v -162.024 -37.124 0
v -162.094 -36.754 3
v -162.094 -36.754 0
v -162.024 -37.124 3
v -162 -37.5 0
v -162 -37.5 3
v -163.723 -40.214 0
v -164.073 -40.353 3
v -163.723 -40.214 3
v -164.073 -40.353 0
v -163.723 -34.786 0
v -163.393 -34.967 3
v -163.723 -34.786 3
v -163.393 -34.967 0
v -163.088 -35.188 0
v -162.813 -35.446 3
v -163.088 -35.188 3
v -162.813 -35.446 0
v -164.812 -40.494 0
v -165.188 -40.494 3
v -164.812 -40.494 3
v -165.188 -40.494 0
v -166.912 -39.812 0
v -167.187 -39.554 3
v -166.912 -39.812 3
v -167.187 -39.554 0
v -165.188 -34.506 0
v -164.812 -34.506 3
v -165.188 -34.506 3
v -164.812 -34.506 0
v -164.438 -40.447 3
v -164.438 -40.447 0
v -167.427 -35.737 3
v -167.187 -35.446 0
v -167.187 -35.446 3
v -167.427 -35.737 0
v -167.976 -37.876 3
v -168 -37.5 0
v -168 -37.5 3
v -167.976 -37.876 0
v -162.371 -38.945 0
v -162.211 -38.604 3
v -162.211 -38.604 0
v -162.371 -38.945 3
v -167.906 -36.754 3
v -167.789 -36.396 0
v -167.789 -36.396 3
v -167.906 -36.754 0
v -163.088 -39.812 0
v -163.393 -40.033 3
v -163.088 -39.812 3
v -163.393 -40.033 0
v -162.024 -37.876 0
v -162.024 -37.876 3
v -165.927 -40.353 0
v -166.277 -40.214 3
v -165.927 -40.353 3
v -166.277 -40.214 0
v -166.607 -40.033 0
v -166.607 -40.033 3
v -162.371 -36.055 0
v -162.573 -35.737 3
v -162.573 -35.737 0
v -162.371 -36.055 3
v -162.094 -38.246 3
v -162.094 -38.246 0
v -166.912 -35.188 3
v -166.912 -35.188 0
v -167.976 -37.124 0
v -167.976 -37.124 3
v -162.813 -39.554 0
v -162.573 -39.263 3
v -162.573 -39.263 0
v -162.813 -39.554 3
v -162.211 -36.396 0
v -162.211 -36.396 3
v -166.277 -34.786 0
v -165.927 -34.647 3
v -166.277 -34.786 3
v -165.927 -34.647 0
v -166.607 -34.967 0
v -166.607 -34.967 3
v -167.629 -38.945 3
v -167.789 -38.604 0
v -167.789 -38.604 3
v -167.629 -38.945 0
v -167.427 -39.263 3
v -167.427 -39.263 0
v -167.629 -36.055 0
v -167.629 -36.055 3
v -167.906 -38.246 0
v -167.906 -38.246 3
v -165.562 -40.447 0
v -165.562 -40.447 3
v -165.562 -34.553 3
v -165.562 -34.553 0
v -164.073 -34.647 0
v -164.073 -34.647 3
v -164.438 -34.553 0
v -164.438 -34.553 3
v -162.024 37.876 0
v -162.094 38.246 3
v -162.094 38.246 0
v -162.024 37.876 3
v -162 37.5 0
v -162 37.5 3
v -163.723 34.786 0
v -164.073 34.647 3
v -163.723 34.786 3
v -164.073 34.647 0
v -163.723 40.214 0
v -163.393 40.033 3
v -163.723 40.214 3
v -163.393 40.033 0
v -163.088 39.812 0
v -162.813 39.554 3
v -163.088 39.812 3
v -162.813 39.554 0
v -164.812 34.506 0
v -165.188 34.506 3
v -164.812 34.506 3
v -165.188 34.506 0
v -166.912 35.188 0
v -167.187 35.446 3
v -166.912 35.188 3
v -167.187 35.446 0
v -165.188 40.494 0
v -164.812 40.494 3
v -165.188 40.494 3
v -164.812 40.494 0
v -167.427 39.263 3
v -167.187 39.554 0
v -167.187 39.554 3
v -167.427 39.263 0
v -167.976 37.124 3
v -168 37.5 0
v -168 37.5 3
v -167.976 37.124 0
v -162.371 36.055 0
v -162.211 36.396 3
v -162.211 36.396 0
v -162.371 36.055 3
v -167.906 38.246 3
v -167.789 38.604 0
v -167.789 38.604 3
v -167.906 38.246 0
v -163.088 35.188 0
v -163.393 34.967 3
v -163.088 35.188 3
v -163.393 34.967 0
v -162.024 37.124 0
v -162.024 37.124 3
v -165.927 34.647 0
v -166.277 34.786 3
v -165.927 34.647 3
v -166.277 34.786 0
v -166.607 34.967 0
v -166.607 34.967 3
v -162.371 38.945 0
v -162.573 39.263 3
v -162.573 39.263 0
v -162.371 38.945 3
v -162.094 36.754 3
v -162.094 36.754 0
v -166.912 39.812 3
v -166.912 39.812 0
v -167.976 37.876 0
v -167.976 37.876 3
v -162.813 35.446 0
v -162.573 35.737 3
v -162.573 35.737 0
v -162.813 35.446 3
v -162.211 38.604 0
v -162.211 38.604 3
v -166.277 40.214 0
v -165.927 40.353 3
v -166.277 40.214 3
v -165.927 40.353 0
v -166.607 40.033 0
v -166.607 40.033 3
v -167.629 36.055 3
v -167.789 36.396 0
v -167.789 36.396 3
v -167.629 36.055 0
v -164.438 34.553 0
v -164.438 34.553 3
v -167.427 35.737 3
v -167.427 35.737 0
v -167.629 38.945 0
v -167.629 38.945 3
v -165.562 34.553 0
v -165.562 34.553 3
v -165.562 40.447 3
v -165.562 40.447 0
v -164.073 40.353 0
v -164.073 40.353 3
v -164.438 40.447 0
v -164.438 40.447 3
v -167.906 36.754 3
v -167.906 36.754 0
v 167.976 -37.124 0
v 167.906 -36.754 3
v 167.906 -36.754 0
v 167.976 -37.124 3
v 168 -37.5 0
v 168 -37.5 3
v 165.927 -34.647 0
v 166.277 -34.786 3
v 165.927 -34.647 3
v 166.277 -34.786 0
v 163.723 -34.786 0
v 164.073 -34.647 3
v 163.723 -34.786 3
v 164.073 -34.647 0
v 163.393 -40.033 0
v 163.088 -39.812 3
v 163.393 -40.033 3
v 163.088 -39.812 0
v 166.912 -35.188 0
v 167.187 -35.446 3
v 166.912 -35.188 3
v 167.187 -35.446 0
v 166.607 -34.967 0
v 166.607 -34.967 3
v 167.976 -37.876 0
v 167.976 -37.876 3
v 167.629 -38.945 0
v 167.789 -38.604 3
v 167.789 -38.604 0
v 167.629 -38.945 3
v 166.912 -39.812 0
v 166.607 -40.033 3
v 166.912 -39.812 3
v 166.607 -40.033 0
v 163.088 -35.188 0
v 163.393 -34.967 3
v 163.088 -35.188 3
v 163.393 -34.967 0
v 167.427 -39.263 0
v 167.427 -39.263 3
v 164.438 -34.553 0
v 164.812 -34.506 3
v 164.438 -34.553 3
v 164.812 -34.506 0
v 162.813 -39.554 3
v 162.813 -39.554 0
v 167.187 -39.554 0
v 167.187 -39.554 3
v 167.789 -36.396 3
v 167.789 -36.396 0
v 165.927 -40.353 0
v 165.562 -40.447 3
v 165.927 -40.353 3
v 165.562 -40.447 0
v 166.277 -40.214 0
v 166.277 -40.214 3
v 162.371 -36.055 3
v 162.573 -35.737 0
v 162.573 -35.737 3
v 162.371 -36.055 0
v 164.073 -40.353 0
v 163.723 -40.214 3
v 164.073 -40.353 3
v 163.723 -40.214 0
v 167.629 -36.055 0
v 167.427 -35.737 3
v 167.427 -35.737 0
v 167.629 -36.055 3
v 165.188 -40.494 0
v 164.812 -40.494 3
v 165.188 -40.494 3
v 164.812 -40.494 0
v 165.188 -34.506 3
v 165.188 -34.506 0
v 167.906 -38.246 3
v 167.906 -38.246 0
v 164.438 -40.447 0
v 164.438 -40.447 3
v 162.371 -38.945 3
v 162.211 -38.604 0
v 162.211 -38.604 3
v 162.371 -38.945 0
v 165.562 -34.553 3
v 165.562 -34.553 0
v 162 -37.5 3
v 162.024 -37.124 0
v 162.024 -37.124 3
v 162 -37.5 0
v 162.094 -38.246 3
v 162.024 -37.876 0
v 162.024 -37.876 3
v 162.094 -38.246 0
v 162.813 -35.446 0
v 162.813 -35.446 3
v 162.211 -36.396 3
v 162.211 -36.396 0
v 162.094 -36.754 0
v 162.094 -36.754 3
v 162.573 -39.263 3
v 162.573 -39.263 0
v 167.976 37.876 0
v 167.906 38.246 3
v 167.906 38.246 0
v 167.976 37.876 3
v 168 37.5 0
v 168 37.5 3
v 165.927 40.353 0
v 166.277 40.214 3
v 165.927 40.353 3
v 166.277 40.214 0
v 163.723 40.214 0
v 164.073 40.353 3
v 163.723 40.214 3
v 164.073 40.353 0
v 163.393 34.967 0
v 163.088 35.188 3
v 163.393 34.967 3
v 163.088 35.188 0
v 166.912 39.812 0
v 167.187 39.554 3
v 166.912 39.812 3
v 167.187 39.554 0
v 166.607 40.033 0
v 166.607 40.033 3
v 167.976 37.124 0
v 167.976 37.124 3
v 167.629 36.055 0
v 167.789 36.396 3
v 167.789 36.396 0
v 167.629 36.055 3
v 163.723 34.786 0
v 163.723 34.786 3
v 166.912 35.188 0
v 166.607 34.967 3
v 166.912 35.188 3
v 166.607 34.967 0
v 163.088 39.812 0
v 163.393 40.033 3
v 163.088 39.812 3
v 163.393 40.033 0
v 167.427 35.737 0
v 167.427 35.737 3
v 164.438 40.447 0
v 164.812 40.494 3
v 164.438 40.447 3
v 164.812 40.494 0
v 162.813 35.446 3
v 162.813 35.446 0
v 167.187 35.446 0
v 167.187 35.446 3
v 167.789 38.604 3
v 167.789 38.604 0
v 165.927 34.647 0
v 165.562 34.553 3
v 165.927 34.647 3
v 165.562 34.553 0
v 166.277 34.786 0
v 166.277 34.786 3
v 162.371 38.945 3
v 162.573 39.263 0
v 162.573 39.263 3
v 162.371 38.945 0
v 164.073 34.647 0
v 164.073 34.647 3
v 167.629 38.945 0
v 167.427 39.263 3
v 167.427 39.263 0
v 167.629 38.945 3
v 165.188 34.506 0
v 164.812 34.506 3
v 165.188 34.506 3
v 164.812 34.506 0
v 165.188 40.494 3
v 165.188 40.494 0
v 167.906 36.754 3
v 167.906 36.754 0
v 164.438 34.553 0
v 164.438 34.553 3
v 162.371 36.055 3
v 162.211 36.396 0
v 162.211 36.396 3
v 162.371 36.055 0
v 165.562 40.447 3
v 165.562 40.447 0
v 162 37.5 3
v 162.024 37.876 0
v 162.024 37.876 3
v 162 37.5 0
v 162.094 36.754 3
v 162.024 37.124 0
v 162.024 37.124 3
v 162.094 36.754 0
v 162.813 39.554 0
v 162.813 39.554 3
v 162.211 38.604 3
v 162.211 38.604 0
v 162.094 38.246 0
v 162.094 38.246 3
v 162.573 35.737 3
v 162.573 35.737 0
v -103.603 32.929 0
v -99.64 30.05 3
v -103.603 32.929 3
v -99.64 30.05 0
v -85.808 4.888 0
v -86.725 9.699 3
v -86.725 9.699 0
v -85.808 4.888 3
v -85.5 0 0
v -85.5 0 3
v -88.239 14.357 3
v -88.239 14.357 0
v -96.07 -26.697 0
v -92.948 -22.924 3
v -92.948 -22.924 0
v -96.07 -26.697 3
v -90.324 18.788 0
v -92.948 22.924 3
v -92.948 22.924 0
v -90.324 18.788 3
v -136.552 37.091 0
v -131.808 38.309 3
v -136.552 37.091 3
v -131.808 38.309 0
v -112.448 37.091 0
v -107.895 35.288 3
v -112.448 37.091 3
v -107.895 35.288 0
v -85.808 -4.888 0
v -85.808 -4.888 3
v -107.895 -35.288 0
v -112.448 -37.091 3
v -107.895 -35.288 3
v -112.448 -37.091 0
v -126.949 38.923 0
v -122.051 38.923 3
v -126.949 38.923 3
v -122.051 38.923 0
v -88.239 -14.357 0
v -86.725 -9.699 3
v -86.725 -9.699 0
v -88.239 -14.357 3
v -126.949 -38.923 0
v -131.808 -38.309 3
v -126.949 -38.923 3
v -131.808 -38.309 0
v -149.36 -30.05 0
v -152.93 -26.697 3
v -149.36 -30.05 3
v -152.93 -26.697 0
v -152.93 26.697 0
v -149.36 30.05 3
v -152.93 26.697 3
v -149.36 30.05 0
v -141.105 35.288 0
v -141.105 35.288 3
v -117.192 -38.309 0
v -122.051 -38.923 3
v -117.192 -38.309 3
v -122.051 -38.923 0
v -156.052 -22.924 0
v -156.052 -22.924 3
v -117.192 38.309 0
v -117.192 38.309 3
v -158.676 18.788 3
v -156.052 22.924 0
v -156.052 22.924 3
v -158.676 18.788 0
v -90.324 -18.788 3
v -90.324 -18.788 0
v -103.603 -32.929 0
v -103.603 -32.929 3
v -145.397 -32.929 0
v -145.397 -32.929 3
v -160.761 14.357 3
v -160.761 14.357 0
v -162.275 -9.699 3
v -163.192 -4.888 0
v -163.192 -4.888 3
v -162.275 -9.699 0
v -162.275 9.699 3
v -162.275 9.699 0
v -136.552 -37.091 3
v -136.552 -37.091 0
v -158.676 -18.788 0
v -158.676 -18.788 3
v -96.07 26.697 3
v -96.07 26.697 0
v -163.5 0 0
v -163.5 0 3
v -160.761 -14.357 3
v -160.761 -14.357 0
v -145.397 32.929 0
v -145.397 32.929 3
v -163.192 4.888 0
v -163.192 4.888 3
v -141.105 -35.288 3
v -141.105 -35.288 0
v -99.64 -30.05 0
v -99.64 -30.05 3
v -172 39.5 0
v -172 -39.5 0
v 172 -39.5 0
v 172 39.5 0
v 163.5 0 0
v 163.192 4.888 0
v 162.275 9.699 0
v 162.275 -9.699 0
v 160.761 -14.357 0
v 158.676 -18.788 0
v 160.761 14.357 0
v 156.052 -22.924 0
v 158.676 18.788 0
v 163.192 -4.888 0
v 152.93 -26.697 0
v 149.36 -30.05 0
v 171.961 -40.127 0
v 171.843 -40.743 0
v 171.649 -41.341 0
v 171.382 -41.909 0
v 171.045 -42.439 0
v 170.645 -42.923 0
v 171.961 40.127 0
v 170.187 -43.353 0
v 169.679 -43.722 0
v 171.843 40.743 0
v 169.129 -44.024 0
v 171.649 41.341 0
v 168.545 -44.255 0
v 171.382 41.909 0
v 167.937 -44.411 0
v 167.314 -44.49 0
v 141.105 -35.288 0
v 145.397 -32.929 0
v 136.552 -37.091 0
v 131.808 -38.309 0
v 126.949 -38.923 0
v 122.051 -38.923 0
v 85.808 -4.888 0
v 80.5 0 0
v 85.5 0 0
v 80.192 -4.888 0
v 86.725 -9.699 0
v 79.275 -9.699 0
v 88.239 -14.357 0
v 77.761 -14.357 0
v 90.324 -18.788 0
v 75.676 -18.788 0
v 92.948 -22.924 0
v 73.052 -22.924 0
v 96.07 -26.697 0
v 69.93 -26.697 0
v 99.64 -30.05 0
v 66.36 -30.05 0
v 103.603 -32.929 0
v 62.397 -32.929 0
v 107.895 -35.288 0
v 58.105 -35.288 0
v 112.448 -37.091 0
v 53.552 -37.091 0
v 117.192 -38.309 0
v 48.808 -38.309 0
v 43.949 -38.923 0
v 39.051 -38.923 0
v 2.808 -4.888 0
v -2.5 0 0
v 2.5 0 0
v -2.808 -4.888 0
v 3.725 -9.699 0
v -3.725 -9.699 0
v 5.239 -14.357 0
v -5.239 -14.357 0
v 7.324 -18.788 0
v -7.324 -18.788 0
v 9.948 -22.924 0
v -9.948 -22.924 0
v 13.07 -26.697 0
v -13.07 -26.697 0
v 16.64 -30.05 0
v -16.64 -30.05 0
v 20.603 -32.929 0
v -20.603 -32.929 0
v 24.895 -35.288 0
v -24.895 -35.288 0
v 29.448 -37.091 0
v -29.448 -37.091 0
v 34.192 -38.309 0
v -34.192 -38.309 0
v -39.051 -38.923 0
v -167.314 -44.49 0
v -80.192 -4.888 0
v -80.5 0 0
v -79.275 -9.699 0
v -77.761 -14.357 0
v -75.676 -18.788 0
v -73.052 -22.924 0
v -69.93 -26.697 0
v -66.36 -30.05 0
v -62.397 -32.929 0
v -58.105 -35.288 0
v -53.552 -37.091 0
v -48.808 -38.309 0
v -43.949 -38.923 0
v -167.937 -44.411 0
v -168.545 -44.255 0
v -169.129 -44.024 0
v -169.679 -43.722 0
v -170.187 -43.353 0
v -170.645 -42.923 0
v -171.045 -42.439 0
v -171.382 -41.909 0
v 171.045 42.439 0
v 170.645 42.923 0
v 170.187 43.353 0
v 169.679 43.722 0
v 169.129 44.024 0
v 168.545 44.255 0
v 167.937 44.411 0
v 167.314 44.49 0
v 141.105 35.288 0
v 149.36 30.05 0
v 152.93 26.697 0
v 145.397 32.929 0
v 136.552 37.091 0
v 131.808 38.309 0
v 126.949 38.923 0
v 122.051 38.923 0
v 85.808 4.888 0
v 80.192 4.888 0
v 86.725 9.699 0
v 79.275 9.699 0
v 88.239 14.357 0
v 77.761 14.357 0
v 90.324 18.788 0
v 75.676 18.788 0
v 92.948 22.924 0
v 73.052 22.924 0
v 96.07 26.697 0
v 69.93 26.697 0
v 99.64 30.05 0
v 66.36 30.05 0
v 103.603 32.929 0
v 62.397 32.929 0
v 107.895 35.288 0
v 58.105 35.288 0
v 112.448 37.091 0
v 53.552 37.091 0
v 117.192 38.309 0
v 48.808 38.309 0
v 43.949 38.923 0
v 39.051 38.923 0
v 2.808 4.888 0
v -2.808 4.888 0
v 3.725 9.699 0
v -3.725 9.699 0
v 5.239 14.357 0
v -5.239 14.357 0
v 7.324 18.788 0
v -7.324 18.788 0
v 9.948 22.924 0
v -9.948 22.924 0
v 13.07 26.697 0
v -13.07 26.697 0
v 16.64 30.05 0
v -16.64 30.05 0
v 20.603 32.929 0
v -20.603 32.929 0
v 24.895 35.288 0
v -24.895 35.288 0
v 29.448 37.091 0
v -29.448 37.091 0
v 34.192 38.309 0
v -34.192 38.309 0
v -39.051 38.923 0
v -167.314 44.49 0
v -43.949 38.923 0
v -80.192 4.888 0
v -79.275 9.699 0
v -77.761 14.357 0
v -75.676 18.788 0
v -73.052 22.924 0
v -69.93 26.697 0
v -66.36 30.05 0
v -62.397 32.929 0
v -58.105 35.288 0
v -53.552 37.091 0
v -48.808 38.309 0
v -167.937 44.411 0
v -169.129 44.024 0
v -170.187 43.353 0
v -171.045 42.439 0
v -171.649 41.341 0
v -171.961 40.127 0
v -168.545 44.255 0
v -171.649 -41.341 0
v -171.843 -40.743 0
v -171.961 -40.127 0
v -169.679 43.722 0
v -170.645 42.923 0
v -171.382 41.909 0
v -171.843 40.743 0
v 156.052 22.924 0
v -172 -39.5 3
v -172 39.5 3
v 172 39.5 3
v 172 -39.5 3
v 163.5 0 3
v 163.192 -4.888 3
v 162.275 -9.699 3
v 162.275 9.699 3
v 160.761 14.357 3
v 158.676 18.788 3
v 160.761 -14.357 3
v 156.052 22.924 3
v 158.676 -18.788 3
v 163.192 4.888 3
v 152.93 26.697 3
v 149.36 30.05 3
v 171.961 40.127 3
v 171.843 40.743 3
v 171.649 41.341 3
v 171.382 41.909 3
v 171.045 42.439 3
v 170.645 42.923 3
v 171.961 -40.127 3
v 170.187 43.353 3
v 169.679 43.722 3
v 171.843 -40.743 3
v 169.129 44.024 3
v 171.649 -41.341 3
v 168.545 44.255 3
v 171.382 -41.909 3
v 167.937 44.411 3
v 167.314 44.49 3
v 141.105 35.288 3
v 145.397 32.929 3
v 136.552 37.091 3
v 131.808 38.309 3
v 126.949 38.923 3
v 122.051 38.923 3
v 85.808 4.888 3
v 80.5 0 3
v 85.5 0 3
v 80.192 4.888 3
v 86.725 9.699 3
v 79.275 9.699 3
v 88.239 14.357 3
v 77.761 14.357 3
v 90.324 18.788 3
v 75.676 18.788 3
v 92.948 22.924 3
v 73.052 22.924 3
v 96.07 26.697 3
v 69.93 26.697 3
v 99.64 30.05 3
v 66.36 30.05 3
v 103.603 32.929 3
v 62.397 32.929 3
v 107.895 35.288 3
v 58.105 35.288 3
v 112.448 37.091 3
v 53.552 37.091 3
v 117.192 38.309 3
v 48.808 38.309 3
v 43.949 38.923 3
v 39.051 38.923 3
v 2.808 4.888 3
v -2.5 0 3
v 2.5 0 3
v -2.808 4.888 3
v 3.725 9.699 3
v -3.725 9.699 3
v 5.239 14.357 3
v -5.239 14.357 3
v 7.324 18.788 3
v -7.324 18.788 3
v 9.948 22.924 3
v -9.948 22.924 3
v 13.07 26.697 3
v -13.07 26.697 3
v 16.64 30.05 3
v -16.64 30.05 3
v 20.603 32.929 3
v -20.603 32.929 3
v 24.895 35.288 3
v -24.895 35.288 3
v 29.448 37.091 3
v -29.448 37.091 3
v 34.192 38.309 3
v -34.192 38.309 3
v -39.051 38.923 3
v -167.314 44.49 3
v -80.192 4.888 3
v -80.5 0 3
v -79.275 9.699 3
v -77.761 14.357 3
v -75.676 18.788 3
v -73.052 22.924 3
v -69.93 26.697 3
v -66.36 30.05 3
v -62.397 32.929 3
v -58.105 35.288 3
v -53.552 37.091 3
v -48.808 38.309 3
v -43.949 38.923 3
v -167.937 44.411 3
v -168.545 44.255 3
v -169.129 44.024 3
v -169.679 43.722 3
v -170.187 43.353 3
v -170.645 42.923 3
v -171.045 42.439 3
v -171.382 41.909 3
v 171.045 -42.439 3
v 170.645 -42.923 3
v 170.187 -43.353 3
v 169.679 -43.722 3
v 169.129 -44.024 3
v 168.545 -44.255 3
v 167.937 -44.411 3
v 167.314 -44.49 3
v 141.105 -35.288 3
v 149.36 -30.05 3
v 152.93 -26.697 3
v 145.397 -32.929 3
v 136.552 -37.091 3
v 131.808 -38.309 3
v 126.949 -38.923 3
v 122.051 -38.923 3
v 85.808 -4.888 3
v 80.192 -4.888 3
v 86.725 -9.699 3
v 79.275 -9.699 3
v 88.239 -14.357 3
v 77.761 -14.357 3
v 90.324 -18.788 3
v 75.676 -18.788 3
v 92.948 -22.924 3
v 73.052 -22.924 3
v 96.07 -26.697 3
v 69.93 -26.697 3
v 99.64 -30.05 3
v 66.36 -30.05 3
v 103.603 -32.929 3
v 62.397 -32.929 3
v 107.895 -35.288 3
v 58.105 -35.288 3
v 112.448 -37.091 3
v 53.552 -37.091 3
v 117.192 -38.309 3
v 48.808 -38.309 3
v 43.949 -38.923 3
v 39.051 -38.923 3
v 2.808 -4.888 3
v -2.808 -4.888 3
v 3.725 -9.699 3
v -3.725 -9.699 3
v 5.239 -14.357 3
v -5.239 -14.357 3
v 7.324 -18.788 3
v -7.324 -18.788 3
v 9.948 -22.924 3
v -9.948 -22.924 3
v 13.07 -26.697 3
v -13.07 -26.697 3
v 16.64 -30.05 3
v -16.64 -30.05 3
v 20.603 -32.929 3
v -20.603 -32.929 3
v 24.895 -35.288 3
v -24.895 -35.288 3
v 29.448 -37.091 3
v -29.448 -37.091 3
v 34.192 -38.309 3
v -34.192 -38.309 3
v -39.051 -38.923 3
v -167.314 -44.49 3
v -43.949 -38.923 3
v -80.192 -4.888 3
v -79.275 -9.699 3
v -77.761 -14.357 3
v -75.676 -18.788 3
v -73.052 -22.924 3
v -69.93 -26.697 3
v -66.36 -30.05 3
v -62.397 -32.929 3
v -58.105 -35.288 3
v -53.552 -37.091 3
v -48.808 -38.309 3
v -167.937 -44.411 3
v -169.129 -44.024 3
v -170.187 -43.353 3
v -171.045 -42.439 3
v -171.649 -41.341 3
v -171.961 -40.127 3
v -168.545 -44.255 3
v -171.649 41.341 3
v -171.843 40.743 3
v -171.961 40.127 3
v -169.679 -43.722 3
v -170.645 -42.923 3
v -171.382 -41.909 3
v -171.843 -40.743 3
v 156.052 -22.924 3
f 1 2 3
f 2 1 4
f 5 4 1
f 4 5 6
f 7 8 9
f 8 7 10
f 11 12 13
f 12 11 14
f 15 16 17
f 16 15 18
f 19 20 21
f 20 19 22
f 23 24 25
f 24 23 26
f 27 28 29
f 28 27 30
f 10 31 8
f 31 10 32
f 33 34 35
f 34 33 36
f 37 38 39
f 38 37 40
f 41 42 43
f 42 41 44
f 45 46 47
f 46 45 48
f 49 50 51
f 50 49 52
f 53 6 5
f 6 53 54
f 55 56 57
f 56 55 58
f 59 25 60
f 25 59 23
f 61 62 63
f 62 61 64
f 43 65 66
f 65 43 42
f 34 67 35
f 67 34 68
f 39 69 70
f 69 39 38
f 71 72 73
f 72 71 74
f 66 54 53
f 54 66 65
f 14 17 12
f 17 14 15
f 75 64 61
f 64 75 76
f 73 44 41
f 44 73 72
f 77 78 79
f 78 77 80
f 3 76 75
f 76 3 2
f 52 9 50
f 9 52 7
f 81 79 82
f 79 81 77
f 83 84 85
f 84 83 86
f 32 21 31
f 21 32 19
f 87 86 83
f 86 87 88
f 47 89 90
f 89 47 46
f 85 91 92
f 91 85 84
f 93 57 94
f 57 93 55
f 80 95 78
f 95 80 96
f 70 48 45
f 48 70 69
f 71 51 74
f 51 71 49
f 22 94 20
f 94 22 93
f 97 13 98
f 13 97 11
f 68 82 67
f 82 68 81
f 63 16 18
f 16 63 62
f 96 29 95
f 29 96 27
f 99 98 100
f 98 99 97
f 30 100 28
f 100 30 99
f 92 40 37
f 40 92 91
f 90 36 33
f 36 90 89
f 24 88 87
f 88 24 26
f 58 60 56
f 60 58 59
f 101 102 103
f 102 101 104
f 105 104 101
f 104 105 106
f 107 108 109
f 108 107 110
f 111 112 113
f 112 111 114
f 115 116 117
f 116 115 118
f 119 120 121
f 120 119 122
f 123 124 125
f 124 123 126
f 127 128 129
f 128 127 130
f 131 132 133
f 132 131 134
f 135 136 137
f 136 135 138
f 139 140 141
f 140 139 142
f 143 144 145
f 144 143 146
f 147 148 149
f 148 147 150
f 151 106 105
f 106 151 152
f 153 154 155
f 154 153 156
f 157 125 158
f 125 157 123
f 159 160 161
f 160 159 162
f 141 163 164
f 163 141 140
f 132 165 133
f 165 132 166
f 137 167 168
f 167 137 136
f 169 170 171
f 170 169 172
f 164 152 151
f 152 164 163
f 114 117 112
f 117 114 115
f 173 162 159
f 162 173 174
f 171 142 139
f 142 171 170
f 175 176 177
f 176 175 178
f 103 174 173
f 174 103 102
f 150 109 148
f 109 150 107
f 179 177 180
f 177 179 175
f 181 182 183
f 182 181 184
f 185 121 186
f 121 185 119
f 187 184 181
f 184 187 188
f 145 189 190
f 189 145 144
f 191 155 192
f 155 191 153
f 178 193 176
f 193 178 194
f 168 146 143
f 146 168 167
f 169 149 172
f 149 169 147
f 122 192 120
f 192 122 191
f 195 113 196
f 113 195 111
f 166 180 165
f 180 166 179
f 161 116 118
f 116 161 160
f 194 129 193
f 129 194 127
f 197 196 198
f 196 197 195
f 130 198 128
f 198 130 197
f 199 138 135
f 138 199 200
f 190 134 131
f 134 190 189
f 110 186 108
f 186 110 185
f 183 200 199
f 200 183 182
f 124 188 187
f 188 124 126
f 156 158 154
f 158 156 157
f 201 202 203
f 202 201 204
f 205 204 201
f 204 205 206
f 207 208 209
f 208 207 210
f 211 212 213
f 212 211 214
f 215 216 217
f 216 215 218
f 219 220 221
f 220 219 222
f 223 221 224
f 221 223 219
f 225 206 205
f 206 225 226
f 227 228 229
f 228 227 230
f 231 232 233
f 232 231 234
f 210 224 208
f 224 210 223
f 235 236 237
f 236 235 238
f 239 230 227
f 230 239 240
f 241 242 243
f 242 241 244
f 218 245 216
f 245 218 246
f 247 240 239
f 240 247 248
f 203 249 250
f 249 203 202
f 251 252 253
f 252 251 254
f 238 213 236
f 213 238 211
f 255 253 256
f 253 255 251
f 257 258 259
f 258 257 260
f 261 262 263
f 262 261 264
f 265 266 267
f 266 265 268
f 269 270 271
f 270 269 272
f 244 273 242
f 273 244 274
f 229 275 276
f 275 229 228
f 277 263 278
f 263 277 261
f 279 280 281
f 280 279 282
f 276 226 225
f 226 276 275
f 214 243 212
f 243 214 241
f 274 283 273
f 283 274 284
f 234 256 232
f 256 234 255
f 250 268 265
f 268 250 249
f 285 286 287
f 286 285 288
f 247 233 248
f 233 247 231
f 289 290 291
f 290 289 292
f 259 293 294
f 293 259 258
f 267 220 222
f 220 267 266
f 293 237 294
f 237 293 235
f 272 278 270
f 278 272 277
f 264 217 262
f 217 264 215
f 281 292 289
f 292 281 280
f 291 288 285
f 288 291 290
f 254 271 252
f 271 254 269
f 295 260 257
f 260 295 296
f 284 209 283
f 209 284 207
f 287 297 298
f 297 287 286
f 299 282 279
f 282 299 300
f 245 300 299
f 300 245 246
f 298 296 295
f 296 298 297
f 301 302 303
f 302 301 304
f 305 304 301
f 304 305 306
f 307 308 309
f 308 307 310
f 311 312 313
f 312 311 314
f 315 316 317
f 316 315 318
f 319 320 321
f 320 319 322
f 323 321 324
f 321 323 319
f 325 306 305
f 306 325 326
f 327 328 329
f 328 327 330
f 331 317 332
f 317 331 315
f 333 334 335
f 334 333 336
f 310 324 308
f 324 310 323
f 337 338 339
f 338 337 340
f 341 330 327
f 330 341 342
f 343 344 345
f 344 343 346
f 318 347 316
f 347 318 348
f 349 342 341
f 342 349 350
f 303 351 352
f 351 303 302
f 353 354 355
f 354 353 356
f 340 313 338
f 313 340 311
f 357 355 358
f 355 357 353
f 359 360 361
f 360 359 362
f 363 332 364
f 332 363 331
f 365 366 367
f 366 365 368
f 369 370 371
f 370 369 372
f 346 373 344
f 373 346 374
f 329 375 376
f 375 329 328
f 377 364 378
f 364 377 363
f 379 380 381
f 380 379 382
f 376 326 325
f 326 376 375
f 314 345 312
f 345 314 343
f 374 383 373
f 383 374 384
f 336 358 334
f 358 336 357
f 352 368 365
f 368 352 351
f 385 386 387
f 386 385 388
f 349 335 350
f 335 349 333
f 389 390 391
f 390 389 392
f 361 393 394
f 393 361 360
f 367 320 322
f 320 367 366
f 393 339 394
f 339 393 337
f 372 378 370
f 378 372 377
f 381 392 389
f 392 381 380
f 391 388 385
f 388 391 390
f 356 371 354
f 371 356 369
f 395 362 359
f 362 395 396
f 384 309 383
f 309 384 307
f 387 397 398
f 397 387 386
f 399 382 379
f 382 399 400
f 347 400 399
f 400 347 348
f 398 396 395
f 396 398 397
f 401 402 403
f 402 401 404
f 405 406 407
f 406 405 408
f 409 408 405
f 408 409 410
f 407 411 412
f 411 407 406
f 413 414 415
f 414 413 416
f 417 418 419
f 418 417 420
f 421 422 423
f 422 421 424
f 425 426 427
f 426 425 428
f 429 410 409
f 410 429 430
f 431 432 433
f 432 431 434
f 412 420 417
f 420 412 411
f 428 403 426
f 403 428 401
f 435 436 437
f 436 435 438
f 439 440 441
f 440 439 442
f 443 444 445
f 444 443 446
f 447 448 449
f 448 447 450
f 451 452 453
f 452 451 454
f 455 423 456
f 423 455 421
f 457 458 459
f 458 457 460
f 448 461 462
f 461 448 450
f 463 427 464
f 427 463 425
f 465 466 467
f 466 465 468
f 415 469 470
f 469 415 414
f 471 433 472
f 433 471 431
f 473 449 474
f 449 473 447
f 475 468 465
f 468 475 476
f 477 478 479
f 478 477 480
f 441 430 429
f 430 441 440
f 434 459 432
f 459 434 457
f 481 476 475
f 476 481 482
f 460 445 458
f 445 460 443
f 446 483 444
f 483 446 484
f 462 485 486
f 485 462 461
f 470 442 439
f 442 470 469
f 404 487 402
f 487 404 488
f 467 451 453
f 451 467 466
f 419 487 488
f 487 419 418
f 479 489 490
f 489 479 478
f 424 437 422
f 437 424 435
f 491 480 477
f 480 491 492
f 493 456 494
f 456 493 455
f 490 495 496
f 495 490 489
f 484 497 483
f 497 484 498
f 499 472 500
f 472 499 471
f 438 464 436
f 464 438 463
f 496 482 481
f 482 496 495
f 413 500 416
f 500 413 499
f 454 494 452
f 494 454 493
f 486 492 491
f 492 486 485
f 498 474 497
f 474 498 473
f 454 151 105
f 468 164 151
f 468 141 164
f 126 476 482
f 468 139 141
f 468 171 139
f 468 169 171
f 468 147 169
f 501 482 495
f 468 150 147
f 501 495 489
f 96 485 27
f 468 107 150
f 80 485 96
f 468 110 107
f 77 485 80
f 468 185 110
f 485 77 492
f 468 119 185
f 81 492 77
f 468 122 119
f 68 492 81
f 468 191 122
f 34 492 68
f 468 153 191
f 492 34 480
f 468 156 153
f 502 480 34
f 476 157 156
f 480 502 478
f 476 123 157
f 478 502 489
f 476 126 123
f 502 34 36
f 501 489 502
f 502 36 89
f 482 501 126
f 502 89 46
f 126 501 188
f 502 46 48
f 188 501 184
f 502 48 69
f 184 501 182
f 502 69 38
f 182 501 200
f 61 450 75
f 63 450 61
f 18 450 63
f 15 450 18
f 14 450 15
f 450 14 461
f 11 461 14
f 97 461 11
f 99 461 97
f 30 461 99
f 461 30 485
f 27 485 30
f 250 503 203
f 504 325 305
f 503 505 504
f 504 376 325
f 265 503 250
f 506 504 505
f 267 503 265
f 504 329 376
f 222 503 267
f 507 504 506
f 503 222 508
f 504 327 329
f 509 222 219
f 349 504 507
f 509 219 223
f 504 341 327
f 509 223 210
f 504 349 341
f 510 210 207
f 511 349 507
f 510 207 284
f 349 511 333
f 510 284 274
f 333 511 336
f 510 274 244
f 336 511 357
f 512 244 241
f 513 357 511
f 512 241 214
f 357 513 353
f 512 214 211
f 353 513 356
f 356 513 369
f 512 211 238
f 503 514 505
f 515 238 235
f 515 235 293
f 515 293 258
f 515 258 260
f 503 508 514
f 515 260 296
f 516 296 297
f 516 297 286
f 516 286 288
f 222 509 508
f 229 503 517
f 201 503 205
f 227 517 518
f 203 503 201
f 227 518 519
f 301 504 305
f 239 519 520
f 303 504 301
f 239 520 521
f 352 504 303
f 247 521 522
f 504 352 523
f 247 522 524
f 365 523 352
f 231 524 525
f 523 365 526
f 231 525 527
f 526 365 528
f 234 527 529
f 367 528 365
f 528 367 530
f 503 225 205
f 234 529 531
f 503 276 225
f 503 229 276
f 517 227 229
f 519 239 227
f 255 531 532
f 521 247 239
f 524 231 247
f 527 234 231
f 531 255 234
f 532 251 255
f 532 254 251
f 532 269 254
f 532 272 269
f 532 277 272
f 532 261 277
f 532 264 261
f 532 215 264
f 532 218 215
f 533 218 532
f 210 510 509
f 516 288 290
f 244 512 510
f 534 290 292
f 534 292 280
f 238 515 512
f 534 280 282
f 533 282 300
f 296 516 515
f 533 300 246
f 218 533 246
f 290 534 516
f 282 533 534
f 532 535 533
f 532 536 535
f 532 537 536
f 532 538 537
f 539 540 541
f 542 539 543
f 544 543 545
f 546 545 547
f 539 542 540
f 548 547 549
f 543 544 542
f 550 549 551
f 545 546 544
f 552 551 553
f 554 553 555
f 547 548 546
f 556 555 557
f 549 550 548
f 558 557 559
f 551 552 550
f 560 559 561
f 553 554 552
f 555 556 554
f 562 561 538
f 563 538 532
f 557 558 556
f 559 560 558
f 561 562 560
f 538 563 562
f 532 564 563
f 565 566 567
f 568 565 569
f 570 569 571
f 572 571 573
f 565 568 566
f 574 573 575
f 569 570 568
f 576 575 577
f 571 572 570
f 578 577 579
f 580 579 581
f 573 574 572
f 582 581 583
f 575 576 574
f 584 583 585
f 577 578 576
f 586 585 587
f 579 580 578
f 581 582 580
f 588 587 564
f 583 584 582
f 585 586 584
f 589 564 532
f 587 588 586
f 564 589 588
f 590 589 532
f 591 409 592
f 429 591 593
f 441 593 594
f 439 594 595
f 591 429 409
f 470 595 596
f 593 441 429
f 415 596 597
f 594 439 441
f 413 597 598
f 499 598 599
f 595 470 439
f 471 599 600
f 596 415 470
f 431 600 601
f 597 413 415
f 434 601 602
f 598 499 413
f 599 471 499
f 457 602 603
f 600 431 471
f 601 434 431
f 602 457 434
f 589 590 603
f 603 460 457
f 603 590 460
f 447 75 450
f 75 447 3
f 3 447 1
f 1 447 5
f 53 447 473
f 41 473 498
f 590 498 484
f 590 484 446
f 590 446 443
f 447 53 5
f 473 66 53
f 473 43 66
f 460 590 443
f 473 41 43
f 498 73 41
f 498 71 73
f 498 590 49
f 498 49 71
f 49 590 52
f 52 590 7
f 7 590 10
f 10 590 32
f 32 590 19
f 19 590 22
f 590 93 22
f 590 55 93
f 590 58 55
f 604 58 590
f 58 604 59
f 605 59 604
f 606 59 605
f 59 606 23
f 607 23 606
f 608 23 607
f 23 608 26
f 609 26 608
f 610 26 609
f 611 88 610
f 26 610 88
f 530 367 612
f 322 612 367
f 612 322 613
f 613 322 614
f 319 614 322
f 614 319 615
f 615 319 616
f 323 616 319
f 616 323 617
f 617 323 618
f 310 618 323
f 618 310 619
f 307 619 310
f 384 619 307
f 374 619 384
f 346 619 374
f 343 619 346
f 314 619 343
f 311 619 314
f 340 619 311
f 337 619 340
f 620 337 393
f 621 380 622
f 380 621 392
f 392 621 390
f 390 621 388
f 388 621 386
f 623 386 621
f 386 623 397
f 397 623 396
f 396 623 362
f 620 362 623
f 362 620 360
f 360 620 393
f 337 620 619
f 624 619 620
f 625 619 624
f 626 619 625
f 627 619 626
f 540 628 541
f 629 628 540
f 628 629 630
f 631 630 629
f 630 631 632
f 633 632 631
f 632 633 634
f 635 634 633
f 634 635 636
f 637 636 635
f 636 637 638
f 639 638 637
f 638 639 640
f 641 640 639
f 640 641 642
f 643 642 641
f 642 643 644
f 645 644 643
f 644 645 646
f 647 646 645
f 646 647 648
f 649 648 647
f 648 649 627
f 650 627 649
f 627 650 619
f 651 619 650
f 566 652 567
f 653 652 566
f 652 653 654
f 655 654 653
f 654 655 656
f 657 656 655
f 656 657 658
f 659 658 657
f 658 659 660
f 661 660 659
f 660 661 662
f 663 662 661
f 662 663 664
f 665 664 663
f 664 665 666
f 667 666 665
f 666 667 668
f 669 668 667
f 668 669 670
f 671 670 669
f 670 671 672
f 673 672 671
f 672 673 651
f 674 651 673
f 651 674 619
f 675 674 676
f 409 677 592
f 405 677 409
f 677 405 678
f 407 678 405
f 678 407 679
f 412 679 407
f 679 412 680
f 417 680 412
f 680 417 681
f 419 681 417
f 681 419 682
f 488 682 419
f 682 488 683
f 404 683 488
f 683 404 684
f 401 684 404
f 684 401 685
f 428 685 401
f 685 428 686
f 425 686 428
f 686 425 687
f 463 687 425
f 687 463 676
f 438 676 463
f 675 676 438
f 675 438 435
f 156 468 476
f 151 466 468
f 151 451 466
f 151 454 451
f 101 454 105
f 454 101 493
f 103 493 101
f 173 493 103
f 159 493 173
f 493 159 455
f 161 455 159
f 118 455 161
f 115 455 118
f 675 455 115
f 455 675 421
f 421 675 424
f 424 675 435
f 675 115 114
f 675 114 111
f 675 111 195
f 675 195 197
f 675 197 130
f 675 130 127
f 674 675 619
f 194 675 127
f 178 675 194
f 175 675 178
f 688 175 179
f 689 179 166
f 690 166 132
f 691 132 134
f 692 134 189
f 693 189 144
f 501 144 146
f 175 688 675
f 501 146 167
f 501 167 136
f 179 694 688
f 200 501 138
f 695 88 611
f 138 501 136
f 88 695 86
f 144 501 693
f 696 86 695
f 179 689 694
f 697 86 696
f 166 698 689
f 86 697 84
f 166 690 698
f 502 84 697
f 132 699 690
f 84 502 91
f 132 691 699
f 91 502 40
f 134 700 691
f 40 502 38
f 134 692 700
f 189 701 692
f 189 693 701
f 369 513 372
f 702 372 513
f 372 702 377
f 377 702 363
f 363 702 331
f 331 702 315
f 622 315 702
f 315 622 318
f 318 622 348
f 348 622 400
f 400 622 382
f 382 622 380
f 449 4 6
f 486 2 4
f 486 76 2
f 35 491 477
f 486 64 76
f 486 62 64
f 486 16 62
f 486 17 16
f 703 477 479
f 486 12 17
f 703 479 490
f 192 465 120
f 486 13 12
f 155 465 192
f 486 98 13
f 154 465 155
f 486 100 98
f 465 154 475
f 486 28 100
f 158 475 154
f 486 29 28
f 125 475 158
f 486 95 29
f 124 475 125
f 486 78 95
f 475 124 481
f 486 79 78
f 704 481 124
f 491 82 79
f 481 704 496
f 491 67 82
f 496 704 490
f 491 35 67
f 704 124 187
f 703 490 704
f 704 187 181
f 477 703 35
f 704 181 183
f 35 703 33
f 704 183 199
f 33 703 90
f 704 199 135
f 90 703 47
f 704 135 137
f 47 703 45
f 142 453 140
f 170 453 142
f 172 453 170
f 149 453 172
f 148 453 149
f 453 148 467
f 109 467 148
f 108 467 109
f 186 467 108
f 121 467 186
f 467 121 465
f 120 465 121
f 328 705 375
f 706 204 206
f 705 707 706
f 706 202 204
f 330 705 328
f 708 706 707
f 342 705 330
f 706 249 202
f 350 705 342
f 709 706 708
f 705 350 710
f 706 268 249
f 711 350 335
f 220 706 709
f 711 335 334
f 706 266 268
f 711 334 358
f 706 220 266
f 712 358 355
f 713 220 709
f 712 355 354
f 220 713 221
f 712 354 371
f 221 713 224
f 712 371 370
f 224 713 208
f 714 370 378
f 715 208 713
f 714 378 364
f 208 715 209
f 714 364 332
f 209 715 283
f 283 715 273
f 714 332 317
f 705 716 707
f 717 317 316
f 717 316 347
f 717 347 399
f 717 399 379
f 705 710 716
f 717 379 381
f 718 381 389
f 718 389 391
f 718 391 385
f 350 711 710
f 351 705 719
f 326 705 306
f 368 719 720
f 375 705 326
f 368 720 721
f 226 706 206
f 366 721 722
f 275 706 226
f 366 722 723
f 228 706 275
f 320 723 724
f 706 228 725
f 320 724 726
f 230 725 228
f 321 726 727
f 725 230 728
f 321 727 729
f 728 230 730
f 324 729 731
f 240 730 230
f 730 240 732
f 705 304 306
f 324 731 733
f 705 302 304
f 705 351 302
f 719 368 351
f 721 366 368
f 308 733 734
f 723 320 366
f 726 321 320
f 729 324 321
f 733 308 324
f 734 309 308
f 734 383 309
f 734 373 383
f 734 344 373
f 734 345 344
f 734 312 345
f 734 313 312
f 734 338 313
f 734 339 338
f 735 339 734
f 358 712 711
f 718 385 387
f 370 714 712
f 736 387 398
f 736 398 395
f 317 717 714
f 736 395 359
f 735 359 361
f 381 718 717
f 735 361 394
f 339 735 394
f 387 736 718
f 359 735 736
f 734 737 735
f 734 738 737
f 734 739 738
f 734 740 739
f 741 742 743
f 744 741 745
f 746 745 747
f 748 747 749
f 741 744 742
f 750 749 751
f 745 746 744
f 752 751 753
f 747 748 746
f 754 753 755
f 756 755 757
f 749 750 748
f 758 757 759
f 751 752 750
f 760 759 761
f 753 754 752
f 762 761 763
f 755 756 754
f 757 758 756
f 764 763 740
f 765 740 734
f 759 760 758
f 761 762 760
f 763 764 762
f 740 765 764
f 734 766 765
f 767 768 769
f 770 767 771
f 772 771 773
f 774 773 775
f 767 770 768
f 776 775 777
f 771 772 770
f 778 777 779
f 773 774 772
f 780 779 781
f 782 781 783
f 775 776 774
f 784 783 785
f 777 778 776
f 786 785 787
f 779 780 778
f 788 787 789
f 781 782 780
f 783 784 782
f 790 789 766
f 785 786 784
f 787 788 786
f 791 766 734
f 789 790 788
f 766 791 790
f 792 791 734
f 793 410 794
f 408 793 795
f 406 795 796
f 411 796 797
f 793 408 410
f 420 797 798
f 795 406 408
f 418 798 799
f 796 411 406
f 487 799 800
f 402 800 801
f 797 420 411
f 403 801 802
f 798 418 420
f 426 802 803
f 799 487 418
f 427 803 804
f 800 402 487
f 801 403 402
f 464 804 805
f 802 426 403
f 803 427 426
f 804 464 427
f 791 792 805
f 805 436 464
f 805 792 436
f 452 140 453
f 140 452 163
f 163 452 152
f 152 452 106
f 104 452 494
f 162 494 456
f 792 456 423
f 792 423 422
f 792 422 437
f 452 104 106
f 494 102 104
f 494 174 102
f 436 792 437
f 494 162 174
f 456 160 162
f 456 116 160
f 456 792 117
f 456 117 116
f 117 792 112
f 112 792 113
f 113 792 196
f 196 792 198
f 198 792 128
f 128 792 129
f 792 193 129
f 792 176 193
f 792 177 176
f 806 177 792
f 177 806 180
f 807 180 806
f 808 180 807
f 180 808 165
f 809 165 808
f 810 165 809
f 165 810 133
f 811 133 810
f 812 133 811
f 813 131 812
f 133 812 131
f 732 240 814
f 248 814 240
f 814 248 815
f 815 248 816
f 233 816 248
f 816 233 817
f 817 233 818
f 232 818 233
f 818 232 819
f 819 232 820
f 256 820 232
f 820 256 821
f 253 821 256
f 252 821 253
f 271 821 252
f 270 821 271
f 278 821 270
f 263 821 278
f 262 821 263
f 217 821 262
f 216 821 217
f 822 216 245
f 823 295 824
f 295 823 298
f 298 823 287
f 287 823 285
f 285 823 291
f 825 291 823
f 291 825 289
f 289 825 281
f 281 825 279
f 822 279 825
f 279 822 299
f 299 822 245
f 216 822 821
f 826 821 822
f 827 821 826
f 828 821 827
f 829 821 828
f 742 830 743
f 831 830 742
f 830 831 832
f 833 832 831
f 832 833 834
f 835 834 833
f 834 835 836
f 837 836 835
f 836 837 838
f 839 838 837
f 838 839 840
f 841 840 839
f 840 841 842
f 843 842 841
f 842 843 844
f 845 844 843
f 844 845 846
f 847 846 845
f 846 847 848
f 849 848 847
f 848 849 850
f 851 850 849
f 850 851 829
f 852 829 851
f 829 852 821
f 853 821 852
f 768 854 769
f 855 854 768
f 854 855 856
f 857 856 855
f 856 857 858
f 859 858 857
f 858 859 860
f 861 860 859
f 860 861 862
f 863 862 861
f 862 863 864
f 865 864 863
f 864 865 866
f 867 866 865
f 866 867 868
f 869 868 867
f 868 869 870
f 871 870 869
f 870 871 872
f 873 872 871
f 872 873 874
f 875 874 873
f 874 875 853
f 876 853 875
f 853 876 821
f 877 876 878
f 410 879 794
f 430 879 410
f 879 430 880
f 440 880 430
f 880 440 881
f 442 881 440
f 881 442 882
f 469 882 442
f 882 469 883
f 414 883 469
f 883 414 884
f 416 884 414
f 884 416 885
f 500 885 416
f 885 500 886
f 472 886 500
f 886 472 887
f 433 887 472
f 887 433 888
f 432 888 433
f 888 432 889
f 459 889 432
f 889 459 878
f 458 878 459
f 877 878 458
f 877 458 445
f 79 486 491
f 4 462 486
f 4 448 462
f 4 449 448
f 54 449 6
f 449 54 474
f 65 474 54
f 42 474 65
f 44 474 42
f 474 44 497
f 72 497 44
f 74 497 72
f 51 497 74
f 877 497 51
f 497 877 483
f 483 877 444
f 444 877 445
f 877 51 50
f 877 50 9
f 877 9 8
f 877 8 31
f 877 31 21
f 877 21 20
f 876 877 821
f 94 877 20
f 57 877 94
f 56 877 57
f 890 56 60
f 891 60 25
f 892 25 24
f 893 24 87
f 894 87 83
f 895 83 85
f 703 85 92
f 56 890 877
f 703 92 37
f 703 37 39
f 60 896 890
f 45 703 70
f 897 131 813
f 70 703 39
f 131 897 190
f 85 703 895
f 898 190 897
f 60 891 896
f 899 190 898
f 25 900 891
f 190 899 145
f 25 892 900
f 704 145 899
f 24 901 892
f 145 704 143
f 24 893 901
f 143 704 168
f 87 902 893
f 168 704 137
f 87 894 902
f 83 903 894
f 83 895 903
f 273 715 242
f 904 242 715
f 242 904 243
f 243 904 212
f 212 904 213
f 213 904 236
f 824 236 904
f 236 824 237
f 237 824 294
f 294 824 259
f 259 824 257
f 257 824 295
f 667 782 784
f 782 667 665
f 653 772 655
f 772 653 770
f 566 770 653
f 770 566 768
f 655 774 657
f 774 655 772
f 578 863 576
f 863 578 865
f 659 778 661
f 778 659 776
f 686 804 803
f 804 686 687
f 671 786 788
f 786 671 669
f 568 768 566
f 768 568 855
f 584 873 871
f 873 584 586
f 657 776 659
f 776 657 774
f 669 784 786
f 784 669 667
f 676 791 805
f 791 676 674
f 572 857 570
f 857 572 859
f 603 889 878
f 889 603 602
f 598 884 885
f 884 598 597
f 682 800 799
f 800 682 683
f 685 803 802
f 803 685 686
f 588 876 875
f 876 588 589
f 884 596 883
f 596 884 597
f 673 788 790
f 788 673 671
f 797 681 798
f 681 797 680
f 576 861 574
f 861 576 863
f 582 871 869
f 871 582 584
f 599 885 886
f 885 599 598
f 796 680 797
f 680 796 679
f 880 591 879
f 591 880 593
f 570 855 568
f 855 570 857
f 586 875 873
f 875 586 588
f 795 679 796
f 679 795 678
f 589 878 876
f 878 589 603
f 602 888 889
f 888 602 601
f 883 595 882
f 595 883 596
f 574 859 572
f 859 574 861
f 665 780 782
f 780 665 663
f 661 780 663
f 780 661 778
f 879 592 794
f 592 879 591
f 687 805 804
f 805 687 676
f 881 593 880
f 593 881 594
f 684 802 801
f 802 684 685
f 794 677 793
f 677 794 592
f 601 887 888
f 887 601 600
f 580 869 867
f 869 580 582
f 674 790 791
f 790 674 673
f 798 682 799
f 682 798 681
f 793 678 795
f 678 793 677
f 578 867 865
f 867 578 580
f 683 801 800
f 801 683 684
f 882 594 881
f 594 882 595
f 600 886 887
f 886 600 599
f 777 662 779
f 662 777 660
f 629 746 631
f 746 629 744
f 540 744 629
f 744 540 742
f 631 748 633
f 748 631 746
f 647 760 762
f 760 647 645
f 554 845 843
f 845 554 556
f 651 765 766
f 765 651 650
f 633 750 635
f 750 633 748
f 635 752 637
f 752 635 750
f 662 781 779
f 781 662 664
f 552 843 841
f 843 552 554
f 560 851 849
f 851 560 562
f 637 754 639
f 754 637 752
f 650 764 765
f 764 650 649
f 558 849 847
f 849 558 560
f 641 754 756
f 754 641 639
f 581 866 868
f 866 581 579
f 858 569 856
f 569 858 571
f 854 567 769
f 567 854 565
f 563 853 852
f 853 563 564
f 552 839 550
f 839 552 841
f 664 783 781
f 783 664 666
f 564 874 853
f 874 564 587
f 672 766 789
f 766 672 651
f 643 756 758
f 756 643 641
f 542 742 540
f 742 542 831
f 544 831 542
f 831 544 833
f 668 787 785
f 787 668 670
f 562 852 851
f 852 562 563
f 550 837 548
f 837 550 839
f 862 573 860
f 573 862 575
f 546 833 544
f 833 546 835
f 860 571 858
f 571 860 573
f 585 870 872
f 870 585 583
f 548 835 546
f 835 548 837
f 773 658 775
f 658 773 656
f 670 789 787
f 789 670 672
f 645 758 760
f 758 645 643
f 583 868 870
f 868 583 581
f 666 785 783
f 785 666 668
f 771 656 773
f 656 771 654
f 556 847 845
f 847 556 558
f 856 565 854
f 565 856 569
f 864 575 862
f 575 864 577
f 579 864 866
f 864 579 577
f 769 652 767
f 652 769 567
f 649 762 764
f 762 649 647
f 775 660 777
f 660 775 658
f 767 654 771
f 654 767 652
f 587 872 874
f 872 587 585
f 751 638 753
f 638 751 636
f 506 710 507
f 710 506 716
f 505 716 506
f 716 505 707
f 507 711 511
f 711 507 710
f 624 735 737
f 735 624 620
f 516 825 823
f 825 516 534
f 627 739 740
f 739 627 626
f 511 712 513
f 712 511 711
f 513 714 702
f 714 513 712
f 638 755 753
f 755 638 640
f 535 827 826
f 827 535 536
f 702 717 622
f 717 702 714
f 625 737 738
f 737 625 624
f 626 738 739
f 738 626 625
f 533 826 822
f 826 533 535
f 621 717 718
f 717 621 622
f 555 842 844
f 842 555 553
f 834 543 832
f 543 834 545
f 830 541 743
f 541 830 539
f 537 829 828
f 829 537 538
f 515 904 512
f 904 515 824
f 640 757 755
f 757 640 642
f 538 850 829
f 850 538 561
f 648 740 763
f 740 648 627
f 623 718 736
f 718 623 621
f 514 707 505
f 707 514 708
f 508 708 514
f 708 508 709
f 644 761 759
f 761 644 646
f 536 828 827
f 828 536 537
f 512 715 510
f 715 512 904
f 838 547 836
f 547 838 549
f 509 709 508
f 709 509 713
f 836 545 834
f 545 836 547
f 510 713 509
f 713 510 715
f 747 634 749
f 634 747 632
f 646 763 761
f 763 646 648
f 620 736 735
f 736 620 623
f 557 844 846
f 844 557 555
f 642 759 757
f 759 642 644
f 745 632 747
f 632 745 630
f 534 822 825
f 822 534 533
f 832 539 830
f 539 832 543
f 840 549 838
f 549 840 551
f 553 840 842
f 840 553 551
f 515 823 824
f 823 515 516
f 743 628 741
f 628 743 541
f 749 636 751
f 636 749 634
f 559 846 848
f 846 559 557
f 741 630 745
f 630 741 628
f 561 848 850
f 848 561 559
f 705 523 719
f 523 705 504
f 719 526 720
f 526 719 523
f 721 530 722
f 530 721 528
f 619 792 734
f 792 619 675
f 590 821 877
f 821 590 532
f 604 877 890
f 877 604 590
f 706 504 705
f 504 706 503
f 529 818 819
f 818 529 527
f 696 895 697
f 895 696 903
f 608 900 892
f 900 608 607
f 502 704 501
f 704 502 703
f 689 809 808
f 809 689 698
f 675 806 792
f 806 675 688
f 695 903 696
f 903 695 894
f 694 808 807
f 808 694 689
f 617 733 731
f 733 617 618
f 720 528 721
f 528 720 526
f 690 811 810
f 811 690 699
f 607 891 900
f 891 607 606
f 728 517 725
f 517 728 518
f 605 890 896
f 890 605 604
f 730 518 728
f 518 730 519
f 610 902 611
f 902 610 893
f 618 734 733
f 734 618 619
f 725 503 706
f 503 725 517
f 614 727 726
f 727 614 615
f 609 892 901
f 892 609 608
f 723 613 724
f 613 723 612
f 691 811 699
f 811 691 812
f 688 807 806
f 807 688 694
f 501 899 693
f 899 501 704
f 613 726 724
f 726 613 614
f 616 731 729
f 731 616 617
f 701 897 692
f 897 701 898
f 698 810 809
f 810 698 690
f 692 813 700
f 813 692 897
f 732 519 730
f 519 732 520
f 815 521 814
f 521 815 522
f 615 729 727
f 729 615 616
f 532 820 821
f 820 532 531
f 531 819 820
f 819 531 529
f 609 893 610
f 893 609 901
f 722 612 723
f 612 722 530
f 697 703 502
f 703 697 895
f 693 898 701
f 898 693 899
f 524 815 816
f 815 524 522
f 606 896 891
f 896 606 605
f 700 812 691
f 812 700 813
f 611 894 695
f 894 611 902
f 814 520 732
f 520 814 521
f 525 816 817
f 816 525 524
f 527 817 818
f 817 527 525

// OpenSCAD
$fn = 50;


difference() {
	union() {
		hull() {
			translate(v = [-167.0000000000, 39.5000000000, 0]) {
				cylinder(h = 3, r = 5);
			}
			translate(v = [167.0000000000, 39.5000000000, 0]) {
				cylinder(h = 3, r = 5);
			}
			translate(v = [-167.0000000000, -39.5000000000, 0]) {
				cylinder(h = 3, r = 5);
			}
			translate(v = [167.0000000000, -39.5000000000, 0]) {
				cylinder(h = 3, r = 5);
			}
		}
	}
	union() {
		#translate(v = [-165.0000000000, -37.5000000000, -100.0000000000]) {
			cylinder(h = 200, r = 3.0000000000);
		}
		#translate(v = [-165.0000000000, 37.5000000000, -100.0000000000]) {
			cylinder(h = 200, r = 3.0000000000);
		}
		#translate(v = [165.0000000000, -37.5000000000, -100.0000000000]) {
			cylinder(h = 200, r = 3.0000000000);
		}
		#translate(v = [165.0000000000, 37.5000000000, -100.0000000000]) {
			cylinder(h = 200, r = 3.0000000000);
		}
		#translate(v = [-124.5000000000, 0, 0]) {
			cylinder(h = 3, r = 39.0000000000);
		}
		#translate(v = [-41.5000000000, 0, 0]) {
			cylinder(h = 3, r = 39.0000000000);
		}
		#translate(v = [41.5000000000, 0, 0]) {
			cylinder(h = 3, r = 39.0000000000);
		}
		#translate(v = [124.5000000000, 0, 0]) {
			cylinder(h = 3, r = 39.0000000000);
		}
	}
}
